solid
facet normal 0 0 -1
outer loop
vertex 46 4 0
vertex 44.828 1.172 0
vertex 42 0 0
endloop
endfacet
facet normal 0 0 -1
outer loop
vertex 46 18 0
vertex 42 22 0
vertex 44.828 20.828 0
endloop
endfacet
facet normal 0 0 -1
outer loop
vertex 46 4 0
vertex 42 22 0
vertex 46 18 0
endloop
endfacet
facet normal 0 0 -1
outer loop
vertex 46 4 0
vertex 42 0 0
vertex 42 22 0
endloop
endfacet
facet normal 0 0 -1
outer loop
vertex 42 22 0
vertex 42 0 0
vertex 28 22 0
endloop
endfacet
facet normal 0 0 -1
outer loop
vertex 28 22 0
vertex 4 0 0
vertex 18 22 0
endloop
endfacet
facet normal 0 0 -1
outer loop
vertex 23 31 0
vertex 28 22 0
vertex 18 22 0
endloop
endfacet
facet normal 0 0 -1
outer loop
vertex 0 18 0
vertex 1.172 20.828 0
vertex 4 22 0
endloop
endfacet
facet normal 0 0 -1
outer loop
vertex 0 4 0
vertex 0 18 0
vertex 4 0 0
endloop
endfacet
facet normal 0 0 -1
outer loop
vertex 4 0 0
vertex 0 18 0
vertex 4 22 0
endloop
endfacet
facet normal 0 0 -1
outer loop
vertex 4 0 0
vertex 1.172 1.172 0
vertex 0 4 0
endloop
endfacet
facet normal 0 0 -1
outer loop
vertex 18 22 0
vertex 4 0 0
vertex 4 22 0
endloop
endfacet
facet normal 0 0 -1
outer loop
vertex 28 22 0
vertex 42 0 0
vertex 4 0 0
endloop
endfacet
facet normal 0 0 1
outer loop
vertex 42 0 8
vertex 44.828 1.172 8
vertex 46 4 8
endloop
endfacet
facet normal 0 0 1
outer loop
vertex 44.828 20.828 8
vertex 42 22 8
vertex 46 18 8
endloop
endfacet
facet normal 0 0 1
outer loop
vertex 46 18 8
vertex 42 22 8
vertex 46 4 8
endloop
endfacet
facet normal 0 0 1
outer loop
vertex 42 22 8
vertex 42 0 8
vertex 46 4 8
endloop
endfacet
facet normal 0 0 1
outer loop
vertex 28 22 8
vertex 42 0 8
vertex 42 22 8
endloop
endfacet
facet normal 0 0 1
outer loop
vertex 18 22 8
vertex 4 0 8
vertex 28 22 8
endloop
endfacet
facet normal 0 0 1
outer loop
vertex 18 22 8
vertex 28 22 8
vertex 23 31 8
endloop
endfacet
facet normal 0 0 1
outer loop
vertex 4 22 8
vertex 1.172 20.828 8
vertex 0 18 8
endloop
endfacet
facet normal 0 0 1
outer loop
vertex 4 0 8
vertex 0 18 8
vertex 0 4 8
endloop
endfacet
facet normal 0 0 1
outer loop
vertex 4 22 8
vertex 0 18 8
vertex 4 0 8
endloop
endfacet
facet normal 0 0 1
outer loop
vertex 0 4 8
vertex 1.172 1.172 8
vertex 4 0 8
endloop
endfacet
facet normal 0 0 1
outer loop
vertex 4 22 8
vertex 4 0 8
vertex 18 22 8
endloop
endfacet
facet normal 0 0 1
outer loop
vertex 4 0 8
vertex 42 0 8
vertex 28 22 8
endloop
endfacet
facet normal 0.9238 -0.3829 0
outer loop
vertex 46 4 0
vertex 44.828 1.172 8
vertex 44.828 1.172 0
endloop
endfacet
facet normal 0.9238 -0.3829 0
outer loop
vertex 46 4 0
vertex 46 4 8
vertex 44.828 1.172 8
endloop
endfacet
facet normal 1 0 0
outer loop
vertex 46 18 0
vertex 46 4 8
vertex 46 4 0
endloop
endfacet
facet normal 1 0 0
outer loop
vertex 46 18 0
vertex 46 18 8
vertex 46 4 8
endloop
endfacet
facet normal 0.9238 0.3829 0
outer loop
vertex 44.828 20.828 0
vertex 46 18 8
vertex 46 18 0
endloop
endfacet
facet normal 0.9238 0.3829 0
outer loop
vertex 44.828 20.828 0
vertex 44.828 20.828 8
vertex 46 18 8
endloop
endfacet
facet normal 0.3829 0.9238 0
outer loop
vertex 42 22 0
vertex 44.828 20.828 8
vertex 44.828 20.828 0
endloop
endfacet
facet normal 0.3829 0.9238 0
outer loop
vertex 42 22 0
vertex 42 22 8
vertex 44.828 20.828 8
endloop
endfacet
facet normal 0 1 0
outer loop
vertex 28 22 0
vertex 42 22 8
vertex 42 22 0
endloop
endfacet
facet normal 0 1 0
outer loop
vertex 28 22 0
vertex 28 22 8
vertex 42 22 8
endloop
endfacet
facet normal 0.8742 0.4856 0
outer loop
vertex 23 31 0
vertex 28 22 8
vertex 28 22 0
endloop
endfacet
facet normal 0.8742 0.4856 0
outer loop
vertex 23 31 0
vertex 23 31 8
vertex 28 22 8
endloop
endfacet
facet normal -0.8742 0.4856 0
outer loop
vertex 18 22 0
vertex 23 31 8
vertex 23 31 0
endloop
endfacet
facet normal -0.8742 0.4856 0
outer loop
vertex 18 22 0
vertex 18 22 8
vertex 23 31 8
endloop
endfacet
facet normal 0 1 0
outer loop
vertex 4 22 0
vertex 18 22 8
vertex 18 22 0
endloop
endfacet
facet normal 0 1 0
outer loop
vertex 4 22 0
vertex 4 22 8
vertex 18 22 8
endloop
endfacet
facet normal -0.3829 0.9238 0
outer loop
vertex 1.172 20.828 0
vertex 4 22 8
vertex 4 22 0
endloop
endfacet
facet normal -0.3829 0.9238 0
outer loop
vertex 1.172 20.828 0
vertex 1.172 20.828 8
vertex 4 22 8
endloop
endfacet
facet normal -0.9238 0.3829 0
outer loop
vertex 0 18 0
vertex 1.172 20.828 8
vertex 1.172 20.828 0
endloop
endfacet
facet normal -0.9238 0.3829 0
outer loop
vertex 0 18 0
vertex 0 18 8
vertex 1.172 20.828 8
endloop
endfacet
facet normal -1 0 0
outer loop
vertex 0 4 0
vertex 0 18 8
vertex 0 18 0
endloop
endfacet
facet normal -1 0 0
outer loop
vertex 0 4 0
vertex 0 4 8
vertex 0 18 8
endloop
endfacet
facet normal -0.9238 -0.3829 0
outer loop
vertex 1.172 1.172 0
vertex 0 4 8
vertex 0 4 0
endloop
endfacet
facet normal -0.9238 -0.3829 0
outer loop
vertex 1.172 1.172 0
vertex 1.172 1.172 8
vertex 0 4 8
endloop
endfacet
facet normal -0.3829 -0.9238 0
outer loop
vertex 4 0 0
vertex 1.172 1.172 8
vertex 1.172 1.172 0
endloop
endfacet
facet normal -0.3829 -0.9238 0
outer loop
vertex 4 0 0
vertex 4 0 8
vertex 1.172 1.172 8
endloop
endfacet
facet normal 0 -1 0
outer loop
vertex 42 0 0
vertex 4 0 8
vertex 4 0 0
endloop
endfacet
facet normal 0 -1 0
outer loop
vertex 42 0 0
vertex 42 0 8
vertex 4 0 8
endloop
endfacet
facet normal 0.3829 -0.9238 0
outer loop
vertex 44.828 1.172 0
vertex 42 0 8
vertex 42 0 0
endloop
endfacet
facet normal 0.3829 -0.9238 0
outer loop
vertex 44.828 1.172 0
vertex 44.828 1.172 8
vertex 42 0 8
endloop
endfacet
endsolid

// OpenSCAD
$fn = 32;

// ----------------------------------------------------------------------
// Ratchet pawl: 46 x 22 mm body, beak 9 mm сверху
// ----------------------------------------------------------------------

// --- parameters (mm) ---
profile_height = 8;       // extrusion height
profile_points = 15;      // points of the closed outline

profile = [[0, 4], [1.172, 1.172], [4, 0], [42, 0], [44.828, 1.172], [46, 4], [46, 18], [44.828, 20.828], [42, 22], [28, 22], [23, 31], [18, 22], [4, 22], [1.172, 20.828], [0, 18]];  // single closed polygon, 15 points, counter clockwise

// --- the one profile operation ---
linear_extrude(height = profile_height) polygon(points = profile);
